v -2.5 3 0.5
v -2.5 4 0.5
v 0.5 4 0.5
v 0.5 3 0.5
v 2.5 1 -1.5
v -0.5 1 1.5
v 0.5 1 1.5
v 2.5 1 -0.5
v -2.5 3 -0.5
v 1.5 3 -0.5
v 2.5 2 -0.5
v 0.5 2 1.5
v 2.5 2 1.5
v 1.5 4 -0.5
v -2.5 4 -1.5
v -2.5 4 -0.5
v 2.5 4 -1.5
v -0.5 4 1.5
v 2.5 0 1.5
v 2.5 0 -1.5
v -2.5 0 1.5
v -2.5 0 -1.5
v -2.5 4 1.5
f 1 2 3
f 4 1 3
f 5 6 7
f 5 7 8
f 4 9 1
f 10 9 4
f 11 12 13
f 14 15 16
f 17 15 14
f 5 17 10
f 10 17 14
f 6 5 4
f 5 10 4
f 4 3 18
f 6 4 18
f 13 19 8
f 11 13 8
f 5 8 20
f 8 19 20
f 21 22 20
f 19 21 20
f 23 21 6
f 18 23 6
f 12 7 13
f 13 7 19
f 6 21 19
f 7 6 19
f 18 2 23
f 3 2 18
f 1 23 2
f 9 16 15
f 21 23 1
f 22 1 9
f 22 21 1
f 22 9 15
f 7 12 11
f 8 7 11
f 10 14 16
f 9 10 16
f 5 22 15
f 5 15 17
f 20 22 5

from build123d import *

# Parameters (mm, degrees)
SKETCH_1_W          = 5
SKETCH_1_H          = 3
EXTRUDE_1_DEPTH     = 4
CUT_EXTRUDE_1_DEPTH = 1
CUT_EXTRUDE_2_DEPTH = 3
CUT_EXTRUDE_3_DEPTH = 2


with BuildPart() as part:
    # 草圖1 → 填料-伸長1 (new body)
    with BuildSketch(Plane(origin=(0, 0, 0), x_dir=(1, 0, 0), z_dir=(0, 1, 0))):
        Rectangle(SKETCH_1_W, SKETCH_1_H)
    extrude(amount=EXTRUDE_1_DEPTH)

    # 草圖3 → 除料-伸長1 (cut)
    with BuildSketch(Plane(origin=(0, 4, 0), x_dir=(1, 0, 0), z_dir=(0, 1, 0))):
        Polygon((-2.5, 0.5), (-2.5, -0.5), (0.5, -0.5), (-0.5, -1.5), (2.5, -1.5), (2.5, 1.5), (1.5, 0.5), align=None)
    extrude(amount=-CUT_EXTRUDE_1_DEPTH, mode=Mode.SUBTRACT)

    # 草圖3<3> → 除料-伸長2 (cut)
    with BuildSketch(Plane(origin=(0, 4, 0), x_dir=(1, 0, 0), z_dir=(0, 1, 0))):
        Polygon((1.5, 0.5), (0.5, -0.5), (-0.5, -1.5), (0.5, -1.5), (2.5, 0.5), (2.5, 1.5), align=None)
    extrude(amount=-CUT_EXTRUDE_2_DEPTH, mode=Mode.SUBTRACT)

    # 草圖3<4> → 除料-伸長3 (cut)
    with BuildSketch(Plane(origin=(0, 4, 0), x_dir=(1, 0, 0), z_dir=(0, 1, 0))):
        Polygon((2.5, 0.5), (0.5, -1.5), (2.5, -1.5), align=None)
    extrude(amount=-CUT_EXTRUDE_3_DEPTH, mode=Mode.SUBTRACT)


solid = part.part
